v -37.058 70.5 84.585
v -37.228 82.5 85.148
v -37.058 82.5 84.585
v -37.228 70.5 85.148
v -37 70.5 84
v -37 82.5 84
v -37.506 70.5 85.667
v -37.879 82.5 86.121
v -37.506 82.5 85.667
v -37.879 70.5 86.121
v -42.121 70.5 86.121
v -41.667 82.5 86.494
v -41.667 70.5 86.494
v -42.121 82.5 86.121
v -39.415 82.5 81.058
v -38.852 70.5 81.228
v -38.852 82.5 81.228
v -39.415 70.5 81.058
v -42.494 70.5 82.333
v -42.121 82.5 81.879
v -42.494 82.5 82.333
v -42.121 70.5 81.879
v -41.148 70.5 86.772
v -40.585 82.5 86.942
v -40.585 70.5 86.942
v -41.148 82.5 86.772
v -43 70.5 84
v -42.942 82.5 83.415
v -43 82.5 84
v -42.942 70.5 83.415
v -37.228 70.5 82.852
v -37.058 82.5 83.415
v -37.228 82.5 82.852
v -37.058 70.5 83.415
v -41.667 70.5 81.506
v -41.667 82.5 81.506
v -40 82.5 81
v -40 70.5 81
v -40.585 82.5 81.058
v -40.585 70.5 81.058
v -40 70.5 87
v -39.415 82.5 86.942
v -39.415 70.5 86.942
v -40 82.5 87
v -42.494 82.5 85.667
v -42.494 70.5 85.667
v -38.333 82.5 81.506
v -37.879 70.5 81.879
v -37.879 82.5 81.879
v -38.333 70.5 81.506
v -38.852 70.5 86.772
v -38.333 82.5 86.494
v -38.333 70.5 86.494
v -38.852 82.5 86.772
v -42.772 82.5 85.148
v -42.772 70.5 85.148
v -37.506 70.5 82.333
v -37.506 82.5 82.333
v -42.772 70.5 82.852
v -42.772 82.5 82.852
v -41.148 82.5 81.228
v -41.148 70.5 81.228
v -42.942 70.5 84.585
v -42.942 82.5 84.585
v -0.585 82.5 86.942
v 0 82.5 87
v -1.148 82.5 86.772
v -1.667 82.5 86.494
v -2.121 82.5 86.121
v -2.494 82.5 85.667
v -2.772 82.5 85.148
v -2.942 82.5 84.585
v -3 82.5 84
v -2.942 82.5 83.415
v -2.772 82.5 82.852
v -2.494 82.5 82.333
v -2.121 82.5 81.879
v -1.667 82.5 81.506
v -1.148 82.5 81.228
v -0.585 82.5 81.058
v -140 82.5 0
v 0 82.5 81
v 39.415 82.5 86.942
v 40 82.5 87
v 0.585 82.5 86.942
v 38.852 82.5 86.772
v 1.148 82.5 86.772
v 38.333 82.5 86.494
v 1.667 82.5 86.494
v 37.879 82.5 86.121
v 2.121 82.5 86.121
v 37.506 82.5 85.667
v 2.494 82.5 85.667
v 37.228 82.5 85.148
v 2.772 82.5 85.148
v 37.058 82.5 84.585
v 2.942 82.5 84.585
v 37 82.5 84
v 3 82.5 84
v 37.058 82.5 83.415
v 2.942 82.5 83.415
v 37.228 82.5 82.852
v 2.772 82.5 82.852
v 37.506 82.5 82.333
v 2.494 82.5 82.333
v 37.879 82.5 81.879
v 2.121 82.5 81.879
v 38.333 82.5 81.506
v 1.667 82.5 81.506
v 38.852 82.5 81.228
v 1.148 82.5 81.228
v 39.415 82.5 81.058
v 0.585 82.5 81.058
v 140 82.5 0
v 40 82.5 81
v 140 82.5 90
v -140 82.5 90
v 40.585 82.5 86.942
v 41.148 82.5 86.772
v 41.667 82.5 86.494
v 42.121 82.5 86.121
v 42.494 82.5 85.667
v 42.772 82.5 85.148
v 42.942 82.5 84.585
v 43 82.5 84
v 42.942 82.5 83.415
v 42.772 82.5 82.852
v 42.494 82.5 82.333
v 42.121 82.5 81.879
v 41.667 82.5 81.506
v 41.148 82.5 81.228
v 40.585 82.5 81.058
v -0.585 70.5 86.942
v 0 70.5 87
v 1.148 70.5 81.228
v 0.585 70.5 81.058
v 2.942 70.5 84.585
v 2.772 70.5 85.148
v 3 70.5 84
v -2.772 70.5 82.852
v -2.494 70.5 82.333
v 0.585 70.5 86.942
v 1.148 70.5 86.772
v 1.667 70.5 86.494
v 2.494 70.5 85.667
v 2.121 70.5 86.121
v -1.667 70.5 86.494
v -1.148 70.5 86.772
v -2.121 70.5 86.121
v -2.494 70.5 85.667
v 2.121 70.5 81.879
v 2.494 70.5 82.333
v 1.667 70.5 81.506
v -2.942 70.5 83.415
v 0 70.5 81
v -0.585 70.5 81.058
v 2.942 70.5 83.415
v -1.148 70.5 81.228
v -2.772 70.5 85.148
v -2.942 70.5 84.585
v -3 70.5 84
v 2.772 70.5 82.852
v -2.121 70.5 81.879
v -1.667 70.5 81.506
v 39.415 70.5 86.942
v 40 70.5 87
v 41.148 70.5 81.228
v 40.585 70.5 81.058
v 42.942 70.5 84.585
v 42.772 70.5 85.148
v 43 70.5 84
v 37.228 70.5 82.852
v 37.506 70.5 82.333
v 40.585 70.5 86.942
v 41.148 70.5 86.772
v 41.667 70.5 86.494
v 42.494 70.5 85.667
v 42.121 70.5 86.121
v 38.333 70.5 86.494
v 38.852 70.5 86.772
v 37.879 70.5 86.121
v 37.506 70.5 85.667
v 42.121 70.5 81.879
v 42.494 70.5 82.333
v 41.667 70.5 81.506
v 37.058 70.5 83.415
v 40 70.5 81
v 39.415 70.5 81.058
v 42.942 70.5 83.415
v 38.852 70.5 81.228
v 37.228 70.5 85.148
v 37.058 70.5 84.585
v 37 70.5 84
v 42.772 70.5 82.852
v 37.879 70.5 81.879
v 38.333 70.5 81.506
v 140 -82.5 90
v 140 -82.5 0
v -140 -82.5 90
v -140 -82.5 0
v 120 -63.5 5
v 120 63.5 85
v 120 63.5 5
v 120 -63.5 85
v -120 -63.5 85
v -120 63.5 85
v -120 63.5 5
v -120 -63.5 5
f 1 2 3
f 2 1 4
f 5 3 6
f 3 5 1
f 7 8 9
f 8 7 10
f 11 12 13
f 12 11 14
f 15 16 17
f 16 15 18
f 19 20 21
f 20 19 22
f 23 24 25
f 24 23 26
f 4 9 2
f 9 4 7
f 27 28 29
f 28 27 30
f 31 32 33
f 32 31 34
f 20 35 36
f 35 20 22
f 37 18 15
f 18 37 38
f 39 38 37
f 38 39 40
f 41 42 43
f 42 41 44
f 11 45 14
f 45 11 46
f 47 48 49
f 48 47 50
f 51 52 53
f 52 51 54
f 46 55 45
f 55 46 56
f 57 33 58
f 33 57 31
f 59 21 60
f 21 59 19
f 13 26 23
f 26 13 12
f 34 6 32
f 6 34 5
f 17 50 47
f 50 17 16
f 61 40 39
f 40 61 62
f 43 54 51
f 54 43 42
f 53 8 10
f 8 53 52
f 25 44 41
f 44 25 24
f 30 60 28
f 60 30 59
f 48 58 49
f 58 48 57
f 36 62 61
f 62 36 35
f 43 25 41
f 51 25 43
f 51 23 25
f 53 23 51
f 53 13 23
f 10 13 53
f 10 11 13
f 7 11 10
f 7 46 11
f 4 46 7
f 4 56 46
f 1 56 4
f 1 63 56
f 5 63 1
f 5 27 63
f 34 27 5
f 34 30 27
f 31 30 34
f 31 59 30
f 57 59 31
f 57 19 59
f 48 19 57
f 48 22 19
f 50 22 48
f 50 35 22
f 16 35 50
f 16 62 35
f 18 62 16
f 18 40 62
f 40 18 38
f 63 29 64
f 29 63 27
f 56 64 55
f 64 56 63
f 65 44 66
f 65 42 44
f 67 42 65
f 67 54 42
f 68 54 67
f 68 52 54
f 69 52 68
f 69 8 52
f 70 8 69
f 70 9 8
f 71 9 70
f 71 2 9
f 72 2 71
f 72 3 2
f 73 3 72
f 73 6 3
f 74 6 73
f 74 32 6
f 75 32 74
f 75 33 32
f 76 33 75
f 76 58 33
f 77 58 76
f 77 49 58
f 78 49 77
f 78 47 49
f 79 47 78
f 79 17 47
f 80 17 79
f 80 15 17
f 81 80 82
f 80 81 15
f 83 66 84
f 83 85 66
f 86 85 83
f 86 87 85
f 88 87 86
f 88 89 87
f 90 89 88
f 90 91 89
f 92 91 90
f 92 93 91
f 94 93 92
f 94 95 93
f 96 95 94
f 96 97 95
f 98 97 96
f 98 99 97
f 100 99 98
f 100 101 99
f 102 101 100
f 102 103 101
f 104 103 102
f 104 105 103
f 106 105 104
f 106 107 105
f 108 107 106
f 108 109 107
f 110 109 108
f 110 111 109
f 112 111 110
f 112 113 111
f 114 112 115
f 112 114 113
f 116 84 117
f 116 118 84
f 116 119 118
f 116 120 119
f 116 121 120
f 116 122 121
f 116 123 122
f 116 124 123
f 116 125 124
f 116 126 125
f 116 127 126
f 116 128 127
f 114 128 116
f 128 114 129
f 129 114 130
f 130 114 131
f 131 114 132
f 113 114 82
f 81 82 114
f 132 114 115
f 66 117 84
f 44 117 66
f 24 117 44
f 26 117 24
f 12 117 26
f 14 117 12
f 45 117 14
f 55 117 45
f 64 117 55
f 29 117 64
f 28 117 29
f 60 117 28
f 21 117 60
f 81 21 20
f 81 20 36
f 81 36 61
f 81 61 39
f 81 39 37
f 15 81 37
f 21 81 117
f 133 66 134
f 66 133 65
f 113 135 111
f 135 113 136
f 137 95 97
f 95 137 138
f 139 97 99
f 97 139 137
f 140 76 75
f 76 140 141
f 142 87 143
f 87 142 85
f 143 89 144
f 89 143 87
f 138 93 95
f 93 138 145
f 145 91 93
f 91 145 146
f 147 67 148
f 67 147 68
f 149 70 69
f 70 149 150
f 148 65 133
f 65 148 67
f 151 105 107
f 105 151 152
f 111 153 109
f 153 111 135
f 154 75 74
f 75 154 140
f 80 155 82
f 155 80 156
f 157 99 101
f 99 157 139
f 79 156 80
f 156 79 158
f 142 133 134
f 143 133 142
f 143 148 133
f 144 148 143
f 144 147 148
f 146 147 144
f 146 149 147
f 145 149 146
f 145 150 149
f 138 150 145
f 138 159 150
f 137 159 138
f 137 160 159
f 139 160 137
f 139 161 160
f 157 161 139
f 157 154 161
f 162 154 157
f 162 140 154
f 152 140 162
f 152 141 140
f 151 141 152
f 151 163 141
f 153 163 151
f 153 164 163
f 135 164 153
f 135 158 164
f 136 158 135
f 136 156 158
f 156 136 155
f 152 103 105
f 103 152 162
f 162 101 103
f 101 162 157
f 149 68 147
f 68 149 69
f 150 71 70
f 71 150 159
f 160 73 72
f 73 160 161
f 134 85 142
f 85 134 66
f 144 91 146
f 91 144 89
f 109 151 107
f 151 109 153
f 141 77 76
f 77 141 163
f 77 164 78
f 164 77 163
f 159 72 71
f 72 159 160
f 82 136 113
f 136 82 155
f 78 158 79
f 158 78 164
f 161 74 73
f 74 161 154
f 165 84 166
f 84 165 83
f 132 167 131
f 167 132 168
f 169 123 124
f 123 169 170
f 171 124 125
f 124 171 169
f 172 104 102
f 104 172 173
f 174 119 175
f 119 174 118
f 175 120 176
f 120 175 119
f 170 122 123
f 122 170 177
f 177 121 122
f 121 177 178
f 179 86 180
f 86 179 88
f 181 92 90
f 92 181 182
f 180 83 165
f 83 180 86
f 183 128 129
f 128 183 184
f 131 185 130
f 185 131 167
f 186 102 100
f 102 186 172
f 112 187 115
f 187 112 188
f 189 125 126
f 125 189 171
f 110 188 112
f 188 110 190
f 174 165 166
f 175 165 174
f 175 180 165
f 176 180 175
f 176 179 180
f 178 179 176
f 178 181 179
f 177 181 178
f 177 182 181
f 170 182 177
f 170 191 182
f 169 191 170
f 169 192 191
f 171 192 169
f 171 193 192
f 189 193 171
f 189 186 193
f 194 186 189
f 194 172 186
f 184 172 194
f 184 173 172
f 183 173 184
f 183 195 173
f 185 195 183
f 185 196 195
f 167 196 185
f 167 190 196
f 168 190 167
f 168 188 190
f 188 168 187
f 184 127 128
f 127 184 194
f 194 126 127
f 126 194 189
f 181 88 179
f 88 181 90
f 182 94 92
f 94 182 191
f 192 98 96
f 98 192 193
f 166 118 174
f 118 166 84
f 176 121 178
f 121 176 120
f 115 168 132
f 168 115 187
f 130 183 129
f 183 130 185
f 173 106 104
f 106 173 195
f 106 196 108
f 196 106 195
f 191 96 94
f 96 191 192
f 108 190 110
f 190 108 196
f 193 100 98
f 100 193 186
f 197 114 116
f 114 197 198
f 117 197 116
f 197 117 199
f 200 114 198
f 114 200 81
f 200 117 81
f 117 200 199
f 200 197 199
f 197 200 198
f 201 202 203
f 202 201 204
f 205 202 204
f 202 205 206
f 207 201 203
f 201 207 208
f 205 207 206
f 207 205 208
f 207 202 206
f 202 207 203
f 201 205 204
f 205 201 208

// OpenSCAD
outer_w=280; outer_d=165; outer_h=90;
inner_w=240; inner_d=127; inner_h=80; bottom_wall=5;
module shell(){ translate([-outer_w/2,-outer_d/2,0]) cube([outer_w,outer_d,outer_h]); }
module hollow(){ translate([-inner_w/2,-inner_d/2,bottom_wall]) cube([inner_w,inner_d,inner_h]); }
module hinge(){ for(i=[-1,0,1]) translate([i*40, outer_d/2, outer_h-6]) rotate([90,0,0]) cylinder(h=12,r=3,$fn=32); }
difference(){ shell(); hollow(); hinge(); }
